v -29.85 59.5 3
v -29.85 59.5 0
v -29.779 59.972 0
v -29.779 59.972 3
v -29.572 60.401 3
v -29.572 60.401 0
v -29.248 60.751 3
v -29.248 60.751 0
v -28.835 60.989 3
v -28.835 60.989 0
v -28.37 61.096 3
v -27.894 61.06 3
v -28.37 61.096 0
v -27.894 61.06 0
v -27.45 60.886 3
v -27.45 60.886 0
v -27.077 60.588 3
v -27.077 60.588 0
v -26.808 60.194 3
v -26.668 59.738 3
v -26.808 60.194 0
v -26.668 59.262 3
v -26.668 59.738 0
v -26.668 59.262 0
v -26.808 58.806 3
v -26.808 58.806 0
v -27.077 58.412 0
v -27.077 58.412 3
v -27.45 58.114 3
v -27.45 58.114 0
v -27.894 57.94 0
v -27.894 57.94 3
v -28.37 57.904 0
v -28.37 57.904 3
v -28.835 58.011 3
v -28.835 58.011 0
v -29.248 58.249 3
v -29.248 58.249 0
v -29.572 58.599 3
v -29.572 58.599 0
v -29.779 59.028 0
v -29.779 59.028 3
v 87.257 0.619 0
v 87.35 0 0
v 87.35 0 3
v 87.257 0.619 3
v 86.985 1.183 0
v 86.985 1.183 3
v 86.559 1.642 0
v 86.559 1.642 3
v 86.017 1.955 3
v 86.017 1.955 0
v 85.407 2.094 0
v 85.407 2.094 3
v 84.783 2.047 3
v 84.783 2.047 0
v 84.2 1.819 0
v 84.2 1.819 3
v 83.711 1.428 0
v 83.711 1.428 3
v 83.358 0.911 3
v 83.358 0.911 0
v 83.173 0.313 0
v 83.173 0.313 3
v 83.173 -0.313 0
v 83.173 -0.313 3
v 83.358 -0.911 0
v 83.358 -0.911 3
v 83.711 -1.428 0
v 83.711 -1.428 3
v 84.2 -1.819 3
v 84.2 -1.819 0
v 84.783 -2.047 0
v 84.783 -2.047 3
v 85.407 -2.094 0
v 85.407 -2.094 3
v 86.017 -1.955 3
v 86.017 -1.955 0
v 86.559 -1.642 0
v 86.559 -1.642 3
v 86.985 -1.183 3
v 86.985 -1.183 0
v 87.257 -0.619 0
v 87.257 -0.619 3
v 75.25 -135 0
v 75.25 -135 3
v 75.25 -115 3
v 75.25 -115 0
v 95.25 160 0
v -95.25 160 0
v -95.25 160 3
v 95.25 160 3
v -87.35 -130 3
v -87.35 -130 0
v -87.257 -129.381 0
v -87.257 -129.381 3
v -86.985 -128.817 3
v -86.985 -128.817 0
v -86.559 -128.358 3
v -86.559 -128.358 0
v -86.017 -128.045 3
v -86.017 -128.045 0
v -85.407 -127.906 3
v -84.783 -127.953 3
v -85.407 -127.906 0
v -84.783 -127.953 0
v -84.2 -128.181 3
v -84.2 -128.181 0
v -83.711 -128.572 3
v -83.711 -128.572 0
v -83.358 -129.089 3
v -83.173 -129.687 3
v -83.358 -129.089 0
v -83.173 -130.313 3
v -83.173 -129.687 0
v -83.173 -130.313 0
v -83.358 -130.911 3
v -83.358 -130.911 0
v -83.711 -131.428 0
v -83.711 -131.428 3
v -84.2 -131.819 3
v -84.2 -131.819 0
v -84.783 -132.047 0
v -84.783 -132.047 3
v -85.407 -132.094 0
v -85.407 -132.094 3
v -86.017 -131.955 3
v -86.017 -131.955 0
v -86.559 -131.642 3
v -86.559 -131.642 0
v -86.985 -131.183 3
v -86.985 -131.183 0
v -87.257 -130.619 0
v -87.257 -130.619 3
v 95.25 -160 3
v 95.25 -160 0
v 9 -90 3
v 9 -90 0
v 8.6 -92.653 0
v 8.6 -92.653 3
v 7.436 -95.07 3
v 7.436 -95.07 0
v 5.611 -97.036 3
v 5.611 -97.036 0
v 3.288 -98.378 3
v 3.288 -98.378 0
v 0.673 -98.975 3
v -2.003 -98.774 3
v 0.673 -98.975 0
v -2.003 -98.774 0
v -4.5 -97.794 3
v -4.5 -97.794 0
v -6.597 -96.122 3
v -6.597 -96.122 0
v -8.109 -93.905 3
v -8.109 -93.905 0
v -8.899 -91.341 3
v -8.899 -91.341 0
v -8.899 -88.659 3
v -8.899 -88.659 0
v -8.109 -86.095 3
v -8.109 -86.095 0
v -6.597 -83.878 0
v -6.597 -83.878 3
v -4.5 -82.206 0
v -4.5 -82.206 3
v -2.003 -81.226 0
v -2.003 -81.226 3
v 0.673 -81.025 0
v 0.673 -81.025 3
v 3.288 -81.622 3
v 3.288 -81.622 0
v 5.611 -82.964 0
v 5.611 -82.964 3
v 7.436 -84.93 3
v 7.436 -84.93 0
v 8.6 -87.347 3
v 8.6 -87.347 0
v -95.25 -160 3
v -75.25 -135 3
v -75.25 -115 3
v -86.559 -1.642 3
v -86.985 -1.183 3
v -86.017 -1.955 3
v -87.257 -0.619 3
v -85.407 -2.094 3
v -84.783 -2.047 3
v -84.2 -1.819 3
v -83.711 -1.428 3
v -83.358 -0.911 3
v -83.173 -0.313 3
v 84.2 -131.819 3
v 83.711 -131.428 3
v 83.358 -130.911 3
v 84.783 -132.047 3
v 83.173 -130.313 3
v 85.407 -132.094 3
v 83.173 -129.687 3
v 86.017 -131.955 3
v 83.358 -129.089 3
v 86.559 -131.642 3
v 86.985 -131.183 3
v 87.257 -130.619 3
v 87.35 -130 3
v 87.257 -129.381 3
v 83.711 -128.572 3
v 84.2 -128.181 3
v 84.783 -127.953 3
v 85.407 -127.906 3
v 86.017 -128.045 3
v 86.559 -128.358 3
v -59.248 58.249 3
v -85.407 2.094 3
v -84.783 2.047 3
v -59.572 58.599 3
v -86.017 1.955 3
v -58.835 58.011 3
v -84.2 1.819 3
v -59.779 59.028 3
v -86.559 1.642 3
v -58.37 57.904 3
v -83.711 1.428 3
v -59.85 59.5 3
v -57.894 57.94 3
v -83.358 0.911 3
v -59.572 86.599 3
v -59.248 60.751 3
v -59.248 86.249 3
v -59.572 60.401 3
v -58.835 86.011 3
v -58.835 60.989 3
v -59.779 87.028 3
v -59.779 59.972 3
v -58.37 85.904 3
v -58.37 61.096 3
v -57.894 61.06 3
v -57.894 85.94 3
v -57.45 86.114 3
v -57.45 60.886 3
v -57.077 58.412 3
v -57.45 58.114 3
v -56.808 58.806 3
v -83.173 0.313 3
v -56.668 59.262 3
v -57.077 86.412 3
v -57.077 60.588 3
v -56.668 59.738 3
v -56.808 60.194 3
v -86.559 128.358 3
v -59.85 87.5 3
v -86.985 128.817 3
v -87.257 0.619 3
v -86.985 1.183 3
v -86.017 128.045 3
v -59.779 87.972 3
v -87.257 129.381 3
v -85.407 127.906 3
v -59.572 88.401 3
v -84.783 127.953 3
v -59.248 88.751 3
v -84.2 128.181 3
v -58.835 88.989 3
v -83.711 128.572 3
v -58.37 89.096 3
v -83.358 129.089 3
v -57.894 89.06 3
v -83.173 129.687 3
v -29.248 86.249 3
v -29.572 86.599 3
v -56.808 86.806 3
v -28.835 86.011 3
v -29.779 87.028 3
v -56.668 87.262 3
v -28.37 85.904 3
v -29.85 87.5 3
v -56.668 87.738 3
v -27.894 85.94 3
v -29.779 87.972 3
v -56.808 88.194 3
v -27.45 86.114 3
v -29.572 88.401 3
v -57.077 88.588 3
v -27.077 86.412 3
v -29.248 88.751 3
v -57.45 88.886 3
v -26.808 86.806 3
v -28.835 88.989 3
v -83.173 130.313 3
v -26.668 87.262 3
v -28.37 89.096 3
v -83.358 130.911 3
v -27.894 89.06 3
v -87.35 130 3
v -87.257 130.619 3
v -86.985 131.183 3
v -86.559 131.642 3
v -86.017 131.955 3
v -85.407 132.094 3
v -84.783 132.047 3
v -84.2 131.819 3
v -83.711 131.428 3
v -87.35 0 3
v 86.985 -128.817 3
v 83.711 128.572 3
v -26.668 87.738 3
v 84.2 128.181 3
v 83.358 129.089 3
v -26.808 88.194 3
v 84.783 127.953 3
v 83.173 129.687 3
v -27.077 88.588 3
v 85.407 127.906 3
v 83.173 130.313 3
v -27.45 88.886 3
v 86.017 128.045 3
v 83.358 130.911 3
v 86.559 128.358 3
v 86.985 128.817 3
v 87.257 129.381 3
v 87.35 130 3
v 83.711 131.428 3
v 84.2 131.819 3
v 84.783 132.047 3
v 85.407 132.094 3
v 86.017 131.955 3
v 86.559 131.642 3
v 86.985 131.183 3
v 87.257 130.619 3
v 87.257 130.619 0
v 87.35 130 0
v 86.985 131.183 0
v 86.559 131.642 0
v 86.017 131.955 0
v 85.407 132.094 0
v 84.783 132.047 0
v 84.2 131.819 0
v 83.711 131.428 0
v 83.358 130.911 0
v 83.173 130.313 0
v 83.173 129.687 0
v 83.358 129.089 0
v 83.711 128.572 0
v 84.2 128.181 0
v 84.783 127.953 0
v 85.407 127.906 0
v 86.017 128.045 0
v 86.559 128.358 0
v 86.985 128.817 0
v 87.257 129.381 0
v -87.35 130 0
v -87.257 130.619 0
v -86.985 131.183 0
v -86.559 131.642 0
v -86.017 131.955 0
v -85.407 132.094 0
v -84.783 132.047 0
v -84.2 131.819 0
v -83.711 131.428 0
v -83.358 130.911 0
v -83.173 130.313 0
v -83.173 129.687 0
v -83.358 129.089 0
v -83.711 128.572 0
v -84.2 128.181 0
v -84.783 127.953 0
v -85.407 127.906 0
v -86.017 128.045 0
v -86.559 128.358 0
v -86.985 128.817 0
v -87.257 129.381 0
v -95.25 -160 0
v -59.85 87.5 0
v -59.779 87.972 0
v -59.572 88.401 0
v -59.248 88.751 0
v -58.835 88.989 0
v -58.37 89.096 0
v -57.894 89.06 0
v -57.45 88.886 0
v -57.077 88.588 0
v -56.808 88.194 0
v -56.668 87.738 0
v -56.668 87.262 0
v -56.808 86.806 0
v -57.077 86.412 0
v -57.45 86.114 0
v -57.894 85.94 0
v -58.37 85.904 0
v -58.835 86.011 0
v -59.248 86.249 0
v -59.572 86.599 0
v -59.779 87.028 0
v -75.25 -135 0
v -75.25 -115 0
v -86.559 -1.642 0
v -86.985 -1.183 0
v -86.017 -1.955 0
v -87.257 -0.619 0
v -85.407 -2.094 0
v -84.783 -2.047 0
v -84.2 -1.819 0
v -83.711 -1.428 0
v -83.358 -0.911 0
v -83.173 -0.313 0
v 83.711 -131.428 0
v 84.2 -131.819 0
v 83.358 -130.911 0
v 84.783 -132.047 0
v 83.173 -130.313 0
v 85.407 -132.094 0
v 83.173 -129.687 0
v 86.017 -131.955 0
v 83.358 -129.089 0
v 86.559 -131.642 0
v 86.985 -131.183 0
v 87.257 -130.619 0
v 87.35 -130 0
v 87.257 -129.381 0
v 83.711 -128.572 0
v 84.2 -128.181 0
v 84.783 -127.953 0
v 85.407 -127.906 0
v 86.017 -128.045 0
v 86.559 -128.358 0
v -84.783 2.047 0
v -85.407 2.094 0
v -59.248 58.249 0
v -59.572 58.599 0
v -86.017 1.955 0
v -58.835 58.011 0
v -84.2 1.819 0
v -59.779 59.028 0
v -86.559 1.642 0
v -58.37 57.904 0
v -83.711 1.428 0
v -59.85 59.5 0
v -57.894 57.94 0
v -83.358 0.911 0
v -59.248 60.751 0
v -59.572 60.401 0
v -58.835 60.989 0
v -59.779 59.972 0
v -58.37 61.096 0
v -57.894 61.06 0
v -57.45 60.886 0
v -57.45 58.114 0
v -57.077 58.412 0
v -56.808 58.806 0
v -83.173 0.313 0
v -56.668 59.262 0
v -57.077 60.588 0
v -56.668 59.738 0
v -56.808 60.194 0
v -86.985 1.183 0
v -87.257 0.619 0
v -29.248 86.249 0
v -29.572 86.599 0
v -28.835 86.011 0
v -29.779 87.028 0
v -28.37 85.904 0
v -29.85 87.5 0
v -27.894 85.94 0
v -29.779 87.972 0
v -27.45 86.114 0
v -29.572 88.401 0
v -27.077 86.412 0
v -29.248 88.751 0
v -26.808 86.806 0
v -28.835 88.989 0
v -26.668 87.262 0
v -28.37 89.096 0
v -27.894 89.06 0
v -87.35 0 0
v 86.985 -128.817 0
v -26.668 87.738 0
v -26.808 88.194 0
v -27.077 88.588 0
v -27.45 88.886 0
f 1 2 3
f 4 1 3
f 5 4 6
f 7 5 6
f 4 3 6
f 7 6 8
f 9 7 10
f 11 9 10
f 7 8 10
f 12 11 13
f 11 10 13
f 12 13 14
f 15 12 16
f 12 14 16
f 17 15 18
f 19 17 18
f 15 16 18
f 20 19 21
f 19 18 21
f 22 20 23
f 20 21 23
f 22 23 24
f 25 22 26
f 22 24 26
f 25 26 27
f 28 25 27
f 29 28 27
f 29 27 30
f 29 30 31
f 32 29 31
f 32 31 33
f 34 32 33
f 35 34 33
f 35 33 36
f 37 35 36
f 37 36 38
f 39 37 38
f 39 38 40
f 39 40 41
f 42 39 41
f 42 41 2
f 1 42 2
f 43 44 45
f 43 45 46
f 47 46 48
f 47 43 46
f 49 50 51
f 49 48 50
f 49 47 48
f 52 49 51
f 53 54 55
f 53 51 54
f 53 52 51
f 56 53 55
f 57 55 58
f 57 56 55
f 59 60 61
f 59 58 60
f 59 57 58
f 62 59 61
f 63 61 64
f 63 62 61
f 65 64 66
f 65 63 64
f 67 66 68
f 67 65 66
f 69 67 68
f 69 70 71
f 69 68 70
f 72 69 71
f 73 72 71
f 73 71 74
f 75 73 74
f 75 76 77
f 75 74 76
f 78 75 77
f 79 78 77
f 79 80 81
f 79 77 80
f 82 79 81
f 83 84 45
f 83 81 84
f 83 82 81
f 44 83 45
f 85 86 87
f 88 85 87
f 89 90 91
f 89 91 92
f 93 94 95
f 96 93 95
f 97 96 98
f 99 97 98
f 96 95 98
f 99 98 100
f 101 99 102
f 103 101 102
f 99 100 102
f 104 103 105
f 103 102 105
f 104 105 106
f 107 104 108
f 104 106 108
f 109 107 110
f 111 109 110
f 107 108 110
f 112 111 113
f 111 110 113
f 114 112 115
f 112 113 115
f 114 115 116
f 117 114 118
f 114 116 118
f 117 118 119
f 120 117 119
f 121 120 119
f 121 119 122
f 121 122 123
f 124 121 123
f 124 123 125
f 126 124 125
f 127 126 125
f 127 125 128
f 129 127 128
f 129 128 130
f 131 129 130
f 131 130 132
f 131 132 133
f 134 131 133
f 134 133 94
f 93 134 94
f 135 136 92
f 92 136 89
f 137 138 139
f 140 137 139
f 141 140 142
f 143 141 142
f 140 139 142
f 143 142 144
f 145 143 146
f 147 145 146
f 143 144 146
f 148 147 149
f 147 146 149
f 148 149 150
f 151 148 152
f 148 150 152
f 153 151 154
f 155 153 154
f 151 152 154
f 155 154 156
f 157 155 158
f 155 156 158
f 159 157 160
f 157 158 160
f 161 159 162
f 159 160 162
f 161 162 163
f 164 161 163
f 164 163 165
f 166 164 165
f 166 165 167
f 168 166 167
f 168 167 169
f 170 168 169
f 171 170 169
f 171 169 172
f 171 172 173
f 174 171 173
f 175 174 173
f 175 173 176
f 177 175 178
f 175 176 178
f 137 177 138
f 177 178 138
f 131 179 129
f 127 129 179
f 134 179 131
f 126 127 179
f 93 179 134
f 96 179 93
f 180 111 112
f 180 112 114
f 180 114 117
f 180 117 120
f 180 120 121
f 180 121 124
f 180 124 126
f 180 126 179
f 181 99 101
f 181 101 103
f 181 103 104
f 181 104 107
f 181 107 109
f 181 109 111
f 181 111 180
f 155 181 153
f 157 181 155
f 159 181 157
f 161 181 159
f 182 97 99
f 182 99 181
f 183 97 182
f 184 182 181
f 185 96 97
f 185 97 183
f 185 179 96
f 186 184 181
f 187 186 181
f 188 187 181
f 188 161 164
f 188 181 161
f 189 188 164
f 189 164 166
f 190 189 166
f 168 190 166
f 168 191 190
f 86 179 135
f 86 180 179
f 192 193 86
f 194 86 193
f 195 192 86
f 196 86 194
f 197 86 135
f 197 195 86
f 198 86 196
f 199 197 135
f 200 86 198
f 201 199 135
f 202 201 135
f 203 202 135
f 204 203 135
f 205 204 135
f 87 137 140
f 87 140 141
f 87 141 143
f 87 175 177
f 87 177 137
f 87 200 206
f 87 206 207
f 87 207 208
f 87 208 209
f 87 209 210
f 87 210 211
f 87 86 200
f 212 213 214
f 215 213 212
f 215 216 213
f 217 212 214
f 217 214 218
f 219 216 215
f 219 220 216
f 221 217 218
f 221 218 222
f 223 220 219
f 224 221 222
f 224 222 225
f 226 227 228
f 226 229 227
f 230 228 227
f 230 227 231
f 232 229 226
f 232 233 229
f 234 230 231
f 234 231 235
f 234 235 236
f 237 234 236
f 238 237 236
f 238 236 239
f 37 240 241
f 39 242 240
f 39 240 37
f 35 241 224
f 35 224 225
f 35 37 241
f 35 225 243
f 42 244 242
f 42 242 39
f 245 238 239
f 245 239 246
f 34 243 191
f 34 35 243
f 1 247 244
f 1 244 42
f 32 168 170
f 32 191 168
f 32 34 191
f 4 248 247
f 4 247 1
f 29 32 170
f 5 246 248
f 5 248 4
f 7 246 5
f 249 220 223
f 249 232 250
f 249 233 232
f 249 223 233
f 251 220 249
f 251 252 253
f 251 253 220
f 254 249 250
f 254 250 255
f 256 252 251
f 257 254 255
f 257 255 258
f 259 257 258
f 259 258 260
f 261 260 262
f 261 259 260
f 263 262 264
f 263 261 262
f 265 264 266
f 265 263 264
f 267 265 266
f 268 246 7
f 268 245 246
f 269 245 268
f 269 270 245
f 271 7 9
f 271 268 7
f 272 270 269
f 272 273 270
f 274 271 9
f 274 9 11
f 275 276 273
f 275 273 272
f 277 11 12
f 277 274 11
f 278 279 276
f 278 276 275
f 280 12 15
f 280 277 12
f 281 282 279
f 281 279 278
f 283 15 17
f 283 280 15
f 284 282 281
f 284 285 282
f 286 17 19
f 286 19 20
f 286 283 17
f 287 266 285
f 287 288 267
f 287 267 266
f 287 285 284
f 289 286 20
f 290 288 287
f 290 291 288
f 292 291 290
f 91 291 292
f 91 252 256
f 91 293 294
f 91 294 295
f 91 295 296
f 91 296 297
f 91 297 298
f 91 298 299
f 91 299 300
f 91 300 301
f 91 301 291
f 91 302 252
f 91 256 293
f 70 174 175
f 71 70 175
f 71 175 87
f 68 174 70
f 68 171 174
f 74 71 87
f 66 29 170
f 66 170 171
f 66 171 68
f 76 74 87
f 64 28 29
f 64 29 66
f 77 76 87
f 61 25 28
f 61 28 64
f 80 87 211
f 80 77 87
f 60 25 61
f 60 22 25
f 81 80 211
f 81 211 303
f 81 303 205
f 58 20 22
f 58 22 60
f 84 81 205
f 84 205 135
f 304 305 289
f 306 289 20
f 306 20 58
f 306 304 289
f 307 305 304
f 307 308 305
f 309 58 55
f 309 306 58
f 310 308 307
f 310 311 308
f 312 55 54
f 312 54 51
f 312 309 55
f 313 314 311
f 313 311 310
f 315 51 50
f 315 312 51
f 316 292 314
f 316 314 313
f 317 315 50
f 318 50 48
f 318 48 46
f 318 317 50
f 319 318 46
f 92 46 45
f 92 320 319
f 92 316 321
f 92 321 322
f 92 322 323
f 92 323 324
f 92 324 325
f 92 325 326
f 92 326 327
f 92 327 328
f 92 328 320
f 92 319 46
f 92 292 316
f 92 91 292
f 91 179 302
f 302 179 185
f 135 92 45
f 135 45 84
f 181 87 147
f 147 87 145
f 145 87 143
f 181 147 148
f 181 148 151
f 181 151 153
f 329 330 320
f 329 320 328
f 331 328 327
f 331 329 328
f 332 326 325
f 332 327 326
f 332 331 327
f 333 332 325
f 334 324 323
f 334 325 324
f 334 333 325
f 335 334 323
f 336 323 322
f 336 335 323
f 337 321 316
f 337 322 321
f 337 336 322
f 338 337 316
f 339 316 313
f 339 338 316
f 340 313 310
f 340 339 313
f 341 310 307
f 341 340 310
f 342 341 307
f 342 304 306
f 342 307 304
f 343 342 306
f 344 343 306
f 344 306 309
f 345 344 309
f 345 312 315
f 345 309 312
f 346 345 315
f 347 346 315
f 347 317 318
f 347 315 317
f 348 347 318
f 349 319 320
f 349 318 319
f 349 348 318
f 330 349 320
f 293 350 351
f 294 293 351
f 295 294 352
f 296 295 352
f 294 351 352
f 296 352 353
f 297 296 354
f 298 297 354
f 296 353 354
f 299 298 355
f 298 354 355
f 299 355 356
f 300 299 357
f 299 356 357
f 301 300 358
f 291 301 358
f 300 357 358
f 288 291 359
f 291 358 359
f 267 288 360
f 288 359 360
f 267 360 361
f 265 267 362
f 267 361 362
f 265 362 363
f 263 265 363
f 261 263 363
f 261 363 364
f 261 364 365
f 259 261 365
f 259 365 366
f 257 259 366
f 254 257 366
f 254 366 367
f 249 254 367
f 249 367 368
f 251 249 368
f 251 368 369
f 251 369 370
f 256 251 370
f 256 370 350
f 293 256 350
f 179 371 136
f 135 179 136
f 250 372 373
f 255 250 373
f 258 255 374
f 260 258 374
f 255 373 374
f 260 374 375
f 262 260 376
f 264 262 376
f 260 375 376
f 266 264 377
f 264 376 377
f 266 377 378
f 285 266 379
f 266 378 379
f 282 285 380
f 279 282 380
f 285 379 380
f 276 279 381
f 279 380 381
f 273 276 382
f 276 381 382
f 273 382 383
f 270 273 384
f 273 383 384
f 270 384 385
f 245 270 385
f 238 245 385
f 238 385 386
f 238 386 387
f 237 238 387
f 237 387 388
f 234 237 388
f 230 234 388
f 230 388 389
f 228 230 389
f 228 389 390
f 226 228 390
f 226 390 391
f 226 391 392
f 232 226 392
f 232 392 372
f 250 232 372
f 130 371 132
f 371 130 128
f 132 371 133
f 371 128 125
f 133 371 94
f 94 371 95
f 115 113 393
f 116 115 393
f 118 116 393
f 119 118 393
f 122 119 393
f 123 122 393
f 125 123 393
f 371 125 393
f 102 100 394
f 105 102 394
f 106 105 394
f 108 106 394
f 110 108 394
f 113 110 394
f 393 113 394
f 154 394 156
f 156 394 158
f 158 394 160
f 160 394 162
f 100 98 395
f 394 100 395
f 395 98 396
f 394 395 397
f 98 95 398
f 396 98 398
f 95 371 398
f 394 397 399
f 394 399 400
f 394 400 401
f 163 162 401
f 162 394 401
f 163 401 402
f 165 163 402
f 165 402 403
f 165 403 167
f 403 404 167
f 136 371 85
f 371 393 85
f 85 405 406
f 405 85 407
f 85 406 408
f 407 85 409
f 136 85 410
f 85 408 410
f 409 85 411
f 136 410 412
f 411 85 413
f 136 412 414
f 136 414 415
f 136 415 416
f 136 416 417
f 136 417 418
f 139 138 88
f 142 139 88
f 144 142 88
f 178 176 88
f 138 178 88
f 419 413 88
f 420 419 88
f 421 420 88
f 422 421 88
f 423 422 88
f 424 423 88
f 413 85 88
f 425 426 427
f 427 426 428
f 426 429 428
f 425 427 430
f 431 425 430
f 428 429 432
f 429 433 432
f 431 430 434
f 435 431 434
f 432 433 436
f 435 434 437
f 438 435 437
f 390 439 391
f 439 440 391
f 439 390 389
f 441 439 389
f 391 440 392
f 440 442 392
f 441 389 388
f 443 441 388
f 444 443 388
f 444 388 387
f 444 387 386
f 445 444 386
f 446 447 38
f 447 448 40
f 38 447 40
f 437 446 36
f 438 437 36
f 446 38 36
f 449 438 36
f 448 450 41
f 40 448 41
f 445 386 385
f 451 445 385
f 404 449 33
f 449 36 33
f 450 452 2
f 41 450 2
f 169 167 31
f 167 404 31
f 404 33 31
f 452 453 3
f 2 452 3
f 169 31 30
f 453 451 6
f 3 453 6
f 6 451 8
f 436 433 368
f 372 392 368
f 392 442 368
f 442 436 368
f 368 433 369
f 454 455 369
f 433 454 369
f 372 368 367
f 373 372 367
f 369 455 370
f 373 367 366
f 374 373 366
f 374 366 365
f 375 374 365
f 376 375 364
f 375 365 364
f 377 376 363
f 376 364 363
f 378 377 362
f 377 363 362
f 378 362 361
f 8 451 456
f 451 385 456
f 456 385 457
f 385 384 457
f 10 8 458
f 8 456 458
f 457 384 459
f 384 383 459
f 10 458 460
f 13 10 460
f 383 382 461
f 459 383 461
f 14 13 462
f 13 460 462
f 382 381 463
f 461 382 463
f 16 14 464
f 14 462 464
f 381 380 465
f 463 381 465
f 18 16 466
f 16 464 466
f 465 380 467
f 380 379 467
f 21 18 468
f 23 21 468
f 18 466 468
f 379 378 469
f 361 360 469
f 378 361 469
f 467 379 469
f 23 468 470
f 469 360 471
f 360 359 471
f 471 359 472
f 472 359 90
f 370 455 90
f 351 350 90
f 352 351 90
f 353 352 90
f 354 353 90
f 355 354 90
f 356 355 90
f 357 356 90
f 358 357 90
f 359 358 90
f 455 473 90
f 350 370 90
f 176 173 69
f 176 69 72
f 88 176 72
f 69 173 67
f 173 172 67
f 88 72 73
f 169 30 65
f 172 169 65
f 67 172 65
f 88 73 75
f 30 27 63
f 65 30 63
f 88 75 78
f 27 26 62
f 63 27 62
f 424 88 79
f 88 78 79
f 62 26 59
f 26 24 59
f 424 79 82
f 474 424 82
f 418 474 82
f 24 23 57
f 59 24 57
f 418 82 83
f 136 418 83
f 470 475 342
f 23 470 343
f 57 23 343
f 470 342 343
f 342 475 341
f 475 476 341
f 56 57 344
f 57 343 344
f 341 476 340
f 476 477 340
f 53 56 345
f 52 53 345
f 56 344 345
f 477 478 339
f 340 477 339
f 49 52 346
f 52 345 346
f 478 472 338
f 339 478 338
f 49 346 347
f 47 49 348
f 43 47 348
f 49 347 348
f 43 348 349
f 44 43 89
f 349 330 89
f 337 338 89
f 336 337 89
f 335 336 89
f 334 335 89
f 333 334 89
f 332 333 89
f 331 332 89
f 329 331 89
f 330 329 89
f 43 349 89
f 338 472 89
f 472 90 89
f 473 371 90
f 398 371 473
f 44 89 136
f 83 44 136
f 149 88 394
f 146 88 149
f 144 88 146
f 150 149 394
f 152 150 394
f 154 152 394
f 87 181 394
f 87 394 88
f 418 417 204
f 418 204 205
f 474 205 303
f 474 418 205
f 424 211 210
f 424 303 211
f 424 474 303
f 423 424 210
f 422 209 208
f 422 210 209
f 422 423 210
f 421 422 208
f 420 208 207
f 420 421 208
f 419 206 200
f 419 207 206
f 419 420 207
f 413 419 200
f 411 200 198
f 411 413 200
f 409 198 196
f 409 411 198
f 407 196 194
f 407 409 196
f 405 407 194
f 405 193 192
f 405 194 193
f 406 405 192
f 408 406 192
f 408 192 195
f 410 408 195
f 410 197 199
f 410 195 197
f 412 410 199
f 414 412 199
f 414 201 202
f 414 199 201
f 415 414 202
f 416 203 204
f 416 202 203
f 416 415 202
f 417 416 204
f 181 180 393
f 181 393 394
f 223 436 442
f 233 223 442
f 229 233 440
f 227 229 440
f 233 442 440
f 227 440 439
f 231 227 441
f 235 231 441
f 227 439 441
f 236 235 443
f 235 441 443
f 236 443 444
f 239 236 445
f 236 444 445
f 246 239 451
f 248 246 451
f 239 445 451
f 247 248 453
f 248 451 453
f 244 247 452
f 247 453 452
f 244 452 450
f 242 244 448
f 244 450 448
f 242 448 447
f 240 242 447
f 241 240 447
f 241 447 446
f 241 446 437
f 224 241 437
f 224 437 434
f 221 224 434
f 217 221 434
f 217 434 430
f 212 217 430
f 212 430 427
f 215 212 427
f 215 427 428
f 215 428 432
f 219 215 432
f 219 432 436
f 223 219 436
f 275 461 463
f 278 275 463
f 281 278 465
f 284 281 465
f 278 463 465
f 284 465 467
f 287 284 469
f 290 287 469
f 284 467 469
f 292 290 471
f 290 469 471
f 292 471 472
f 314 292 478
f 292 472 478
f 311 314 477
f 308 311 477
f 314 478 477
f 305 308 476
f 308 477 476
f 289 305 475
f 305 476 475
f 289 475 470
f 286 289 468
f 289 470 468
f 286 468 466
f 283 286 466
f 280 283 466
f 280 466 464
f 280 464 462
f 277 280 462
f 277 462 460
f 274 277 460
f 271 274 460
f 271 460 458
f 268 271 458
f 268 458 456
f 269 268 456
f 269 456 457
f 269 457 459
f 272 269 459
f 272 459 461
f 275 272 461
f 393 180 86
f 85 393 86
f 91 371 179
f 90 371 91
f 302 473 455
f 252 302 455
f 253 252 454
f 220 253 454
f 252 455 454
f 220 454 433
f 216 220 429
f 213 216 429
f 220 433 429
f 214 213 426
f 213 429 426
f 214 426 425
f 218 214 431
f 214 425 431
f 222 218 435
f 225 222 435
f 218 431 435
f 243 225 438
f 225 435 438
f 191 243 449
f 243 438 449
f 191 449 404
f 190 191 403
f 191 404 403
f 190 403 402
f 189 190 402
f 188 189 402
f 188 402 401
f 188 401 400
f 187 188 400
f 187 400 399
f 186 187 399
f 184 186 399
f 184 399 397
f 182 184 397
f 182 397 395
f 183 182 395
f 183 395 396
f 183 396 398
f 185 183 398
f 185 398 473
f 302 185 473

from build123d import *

# Parameters (mm, degrees)
F1_W      = 190.5
F1_H      = 320
F2_DEPTH  = 3
F4_D      = 4.2
F4_DEPTH  = 4
F4_TIP    = 1.2618073
F6_D      = 3.2
F6_DEPTH  = 4
F6_TIP    = 0.9613769904
F7_W      = 150.5
F7_H      = 20
F8_DEPTH  = 25
F9_R      = 9
F10_DEPTH = 3


# Not quite as in the source:
# - a pattern or mirror of a feature is missing from the dataset's text; its kind, count and spacing are read off the source's solid


with BuildPart() as f2:
    # F1 (on Top) → F2 (new body)
    with BuildSketch(Plane.XY):
        Rectangle(F1_W, F1_H)
    extrude(amount=F2_DEPTH)

    # F4
    with Locations(Plane.XY.offset(3)):
        with Locations((-85.25, 130), (-85.25, 0), (-85.25, -130)):
            f4 = Hole(F4_D / 2, depth=F4_DEPTH)
            with Locations((0, 0, -(F4_DEPTH + F4_TIP / 2))):  # 118° drill point
                Cone(0, F4_D / 2, F4_TIP, mode=Mode.SUBTRACT)

    # F4_copies: F4 across plane
    add(f4.mirror(Plane(origin=(0, 0, 0), x_dir=(0, 0, 1), z_dir=(1, 0, 0))), mode=Mode.SUBTRACT)

    # F6
    with Locations(Plane.XY.offset(3)):
        with Locations((-58.25, 87.5), (-58.25, 59.5), (-28.25, 59.5), (-28.25, 87.5)):
            Hole(F6_D / 2, depth=F6_DEPTH)
            with Locations((0, 0, -(F6_DEPTH + F6_TIP / 2))):  # 118° drill point
                Cone(0, F6_D / 2, F6_TIP, mode=Mode.SUBTRACT)

    # F7 (on face) → F8 (cut)
    with BuildSketch(Plane.XY.offset(3)):
        with Locations((0, -125)):
            Rectangle(F7_W, F7_H)
    extrude(amount=-F8_DEPTH, mode=Mode.SUBTRACT)

    # F9 (on face) → F10 (cut, through all)
    with BuildSketch(Plane(origin=(0, 0, 0), x_dir=(1, 0, 0), z_dir=(0, 0, -1))):
        with Locations((0, 90)):
            Circle(F9_R)
    extrude(amount=-F10_DEPTH, mode=Mode.SUBTRACT)


solid = f2.part
